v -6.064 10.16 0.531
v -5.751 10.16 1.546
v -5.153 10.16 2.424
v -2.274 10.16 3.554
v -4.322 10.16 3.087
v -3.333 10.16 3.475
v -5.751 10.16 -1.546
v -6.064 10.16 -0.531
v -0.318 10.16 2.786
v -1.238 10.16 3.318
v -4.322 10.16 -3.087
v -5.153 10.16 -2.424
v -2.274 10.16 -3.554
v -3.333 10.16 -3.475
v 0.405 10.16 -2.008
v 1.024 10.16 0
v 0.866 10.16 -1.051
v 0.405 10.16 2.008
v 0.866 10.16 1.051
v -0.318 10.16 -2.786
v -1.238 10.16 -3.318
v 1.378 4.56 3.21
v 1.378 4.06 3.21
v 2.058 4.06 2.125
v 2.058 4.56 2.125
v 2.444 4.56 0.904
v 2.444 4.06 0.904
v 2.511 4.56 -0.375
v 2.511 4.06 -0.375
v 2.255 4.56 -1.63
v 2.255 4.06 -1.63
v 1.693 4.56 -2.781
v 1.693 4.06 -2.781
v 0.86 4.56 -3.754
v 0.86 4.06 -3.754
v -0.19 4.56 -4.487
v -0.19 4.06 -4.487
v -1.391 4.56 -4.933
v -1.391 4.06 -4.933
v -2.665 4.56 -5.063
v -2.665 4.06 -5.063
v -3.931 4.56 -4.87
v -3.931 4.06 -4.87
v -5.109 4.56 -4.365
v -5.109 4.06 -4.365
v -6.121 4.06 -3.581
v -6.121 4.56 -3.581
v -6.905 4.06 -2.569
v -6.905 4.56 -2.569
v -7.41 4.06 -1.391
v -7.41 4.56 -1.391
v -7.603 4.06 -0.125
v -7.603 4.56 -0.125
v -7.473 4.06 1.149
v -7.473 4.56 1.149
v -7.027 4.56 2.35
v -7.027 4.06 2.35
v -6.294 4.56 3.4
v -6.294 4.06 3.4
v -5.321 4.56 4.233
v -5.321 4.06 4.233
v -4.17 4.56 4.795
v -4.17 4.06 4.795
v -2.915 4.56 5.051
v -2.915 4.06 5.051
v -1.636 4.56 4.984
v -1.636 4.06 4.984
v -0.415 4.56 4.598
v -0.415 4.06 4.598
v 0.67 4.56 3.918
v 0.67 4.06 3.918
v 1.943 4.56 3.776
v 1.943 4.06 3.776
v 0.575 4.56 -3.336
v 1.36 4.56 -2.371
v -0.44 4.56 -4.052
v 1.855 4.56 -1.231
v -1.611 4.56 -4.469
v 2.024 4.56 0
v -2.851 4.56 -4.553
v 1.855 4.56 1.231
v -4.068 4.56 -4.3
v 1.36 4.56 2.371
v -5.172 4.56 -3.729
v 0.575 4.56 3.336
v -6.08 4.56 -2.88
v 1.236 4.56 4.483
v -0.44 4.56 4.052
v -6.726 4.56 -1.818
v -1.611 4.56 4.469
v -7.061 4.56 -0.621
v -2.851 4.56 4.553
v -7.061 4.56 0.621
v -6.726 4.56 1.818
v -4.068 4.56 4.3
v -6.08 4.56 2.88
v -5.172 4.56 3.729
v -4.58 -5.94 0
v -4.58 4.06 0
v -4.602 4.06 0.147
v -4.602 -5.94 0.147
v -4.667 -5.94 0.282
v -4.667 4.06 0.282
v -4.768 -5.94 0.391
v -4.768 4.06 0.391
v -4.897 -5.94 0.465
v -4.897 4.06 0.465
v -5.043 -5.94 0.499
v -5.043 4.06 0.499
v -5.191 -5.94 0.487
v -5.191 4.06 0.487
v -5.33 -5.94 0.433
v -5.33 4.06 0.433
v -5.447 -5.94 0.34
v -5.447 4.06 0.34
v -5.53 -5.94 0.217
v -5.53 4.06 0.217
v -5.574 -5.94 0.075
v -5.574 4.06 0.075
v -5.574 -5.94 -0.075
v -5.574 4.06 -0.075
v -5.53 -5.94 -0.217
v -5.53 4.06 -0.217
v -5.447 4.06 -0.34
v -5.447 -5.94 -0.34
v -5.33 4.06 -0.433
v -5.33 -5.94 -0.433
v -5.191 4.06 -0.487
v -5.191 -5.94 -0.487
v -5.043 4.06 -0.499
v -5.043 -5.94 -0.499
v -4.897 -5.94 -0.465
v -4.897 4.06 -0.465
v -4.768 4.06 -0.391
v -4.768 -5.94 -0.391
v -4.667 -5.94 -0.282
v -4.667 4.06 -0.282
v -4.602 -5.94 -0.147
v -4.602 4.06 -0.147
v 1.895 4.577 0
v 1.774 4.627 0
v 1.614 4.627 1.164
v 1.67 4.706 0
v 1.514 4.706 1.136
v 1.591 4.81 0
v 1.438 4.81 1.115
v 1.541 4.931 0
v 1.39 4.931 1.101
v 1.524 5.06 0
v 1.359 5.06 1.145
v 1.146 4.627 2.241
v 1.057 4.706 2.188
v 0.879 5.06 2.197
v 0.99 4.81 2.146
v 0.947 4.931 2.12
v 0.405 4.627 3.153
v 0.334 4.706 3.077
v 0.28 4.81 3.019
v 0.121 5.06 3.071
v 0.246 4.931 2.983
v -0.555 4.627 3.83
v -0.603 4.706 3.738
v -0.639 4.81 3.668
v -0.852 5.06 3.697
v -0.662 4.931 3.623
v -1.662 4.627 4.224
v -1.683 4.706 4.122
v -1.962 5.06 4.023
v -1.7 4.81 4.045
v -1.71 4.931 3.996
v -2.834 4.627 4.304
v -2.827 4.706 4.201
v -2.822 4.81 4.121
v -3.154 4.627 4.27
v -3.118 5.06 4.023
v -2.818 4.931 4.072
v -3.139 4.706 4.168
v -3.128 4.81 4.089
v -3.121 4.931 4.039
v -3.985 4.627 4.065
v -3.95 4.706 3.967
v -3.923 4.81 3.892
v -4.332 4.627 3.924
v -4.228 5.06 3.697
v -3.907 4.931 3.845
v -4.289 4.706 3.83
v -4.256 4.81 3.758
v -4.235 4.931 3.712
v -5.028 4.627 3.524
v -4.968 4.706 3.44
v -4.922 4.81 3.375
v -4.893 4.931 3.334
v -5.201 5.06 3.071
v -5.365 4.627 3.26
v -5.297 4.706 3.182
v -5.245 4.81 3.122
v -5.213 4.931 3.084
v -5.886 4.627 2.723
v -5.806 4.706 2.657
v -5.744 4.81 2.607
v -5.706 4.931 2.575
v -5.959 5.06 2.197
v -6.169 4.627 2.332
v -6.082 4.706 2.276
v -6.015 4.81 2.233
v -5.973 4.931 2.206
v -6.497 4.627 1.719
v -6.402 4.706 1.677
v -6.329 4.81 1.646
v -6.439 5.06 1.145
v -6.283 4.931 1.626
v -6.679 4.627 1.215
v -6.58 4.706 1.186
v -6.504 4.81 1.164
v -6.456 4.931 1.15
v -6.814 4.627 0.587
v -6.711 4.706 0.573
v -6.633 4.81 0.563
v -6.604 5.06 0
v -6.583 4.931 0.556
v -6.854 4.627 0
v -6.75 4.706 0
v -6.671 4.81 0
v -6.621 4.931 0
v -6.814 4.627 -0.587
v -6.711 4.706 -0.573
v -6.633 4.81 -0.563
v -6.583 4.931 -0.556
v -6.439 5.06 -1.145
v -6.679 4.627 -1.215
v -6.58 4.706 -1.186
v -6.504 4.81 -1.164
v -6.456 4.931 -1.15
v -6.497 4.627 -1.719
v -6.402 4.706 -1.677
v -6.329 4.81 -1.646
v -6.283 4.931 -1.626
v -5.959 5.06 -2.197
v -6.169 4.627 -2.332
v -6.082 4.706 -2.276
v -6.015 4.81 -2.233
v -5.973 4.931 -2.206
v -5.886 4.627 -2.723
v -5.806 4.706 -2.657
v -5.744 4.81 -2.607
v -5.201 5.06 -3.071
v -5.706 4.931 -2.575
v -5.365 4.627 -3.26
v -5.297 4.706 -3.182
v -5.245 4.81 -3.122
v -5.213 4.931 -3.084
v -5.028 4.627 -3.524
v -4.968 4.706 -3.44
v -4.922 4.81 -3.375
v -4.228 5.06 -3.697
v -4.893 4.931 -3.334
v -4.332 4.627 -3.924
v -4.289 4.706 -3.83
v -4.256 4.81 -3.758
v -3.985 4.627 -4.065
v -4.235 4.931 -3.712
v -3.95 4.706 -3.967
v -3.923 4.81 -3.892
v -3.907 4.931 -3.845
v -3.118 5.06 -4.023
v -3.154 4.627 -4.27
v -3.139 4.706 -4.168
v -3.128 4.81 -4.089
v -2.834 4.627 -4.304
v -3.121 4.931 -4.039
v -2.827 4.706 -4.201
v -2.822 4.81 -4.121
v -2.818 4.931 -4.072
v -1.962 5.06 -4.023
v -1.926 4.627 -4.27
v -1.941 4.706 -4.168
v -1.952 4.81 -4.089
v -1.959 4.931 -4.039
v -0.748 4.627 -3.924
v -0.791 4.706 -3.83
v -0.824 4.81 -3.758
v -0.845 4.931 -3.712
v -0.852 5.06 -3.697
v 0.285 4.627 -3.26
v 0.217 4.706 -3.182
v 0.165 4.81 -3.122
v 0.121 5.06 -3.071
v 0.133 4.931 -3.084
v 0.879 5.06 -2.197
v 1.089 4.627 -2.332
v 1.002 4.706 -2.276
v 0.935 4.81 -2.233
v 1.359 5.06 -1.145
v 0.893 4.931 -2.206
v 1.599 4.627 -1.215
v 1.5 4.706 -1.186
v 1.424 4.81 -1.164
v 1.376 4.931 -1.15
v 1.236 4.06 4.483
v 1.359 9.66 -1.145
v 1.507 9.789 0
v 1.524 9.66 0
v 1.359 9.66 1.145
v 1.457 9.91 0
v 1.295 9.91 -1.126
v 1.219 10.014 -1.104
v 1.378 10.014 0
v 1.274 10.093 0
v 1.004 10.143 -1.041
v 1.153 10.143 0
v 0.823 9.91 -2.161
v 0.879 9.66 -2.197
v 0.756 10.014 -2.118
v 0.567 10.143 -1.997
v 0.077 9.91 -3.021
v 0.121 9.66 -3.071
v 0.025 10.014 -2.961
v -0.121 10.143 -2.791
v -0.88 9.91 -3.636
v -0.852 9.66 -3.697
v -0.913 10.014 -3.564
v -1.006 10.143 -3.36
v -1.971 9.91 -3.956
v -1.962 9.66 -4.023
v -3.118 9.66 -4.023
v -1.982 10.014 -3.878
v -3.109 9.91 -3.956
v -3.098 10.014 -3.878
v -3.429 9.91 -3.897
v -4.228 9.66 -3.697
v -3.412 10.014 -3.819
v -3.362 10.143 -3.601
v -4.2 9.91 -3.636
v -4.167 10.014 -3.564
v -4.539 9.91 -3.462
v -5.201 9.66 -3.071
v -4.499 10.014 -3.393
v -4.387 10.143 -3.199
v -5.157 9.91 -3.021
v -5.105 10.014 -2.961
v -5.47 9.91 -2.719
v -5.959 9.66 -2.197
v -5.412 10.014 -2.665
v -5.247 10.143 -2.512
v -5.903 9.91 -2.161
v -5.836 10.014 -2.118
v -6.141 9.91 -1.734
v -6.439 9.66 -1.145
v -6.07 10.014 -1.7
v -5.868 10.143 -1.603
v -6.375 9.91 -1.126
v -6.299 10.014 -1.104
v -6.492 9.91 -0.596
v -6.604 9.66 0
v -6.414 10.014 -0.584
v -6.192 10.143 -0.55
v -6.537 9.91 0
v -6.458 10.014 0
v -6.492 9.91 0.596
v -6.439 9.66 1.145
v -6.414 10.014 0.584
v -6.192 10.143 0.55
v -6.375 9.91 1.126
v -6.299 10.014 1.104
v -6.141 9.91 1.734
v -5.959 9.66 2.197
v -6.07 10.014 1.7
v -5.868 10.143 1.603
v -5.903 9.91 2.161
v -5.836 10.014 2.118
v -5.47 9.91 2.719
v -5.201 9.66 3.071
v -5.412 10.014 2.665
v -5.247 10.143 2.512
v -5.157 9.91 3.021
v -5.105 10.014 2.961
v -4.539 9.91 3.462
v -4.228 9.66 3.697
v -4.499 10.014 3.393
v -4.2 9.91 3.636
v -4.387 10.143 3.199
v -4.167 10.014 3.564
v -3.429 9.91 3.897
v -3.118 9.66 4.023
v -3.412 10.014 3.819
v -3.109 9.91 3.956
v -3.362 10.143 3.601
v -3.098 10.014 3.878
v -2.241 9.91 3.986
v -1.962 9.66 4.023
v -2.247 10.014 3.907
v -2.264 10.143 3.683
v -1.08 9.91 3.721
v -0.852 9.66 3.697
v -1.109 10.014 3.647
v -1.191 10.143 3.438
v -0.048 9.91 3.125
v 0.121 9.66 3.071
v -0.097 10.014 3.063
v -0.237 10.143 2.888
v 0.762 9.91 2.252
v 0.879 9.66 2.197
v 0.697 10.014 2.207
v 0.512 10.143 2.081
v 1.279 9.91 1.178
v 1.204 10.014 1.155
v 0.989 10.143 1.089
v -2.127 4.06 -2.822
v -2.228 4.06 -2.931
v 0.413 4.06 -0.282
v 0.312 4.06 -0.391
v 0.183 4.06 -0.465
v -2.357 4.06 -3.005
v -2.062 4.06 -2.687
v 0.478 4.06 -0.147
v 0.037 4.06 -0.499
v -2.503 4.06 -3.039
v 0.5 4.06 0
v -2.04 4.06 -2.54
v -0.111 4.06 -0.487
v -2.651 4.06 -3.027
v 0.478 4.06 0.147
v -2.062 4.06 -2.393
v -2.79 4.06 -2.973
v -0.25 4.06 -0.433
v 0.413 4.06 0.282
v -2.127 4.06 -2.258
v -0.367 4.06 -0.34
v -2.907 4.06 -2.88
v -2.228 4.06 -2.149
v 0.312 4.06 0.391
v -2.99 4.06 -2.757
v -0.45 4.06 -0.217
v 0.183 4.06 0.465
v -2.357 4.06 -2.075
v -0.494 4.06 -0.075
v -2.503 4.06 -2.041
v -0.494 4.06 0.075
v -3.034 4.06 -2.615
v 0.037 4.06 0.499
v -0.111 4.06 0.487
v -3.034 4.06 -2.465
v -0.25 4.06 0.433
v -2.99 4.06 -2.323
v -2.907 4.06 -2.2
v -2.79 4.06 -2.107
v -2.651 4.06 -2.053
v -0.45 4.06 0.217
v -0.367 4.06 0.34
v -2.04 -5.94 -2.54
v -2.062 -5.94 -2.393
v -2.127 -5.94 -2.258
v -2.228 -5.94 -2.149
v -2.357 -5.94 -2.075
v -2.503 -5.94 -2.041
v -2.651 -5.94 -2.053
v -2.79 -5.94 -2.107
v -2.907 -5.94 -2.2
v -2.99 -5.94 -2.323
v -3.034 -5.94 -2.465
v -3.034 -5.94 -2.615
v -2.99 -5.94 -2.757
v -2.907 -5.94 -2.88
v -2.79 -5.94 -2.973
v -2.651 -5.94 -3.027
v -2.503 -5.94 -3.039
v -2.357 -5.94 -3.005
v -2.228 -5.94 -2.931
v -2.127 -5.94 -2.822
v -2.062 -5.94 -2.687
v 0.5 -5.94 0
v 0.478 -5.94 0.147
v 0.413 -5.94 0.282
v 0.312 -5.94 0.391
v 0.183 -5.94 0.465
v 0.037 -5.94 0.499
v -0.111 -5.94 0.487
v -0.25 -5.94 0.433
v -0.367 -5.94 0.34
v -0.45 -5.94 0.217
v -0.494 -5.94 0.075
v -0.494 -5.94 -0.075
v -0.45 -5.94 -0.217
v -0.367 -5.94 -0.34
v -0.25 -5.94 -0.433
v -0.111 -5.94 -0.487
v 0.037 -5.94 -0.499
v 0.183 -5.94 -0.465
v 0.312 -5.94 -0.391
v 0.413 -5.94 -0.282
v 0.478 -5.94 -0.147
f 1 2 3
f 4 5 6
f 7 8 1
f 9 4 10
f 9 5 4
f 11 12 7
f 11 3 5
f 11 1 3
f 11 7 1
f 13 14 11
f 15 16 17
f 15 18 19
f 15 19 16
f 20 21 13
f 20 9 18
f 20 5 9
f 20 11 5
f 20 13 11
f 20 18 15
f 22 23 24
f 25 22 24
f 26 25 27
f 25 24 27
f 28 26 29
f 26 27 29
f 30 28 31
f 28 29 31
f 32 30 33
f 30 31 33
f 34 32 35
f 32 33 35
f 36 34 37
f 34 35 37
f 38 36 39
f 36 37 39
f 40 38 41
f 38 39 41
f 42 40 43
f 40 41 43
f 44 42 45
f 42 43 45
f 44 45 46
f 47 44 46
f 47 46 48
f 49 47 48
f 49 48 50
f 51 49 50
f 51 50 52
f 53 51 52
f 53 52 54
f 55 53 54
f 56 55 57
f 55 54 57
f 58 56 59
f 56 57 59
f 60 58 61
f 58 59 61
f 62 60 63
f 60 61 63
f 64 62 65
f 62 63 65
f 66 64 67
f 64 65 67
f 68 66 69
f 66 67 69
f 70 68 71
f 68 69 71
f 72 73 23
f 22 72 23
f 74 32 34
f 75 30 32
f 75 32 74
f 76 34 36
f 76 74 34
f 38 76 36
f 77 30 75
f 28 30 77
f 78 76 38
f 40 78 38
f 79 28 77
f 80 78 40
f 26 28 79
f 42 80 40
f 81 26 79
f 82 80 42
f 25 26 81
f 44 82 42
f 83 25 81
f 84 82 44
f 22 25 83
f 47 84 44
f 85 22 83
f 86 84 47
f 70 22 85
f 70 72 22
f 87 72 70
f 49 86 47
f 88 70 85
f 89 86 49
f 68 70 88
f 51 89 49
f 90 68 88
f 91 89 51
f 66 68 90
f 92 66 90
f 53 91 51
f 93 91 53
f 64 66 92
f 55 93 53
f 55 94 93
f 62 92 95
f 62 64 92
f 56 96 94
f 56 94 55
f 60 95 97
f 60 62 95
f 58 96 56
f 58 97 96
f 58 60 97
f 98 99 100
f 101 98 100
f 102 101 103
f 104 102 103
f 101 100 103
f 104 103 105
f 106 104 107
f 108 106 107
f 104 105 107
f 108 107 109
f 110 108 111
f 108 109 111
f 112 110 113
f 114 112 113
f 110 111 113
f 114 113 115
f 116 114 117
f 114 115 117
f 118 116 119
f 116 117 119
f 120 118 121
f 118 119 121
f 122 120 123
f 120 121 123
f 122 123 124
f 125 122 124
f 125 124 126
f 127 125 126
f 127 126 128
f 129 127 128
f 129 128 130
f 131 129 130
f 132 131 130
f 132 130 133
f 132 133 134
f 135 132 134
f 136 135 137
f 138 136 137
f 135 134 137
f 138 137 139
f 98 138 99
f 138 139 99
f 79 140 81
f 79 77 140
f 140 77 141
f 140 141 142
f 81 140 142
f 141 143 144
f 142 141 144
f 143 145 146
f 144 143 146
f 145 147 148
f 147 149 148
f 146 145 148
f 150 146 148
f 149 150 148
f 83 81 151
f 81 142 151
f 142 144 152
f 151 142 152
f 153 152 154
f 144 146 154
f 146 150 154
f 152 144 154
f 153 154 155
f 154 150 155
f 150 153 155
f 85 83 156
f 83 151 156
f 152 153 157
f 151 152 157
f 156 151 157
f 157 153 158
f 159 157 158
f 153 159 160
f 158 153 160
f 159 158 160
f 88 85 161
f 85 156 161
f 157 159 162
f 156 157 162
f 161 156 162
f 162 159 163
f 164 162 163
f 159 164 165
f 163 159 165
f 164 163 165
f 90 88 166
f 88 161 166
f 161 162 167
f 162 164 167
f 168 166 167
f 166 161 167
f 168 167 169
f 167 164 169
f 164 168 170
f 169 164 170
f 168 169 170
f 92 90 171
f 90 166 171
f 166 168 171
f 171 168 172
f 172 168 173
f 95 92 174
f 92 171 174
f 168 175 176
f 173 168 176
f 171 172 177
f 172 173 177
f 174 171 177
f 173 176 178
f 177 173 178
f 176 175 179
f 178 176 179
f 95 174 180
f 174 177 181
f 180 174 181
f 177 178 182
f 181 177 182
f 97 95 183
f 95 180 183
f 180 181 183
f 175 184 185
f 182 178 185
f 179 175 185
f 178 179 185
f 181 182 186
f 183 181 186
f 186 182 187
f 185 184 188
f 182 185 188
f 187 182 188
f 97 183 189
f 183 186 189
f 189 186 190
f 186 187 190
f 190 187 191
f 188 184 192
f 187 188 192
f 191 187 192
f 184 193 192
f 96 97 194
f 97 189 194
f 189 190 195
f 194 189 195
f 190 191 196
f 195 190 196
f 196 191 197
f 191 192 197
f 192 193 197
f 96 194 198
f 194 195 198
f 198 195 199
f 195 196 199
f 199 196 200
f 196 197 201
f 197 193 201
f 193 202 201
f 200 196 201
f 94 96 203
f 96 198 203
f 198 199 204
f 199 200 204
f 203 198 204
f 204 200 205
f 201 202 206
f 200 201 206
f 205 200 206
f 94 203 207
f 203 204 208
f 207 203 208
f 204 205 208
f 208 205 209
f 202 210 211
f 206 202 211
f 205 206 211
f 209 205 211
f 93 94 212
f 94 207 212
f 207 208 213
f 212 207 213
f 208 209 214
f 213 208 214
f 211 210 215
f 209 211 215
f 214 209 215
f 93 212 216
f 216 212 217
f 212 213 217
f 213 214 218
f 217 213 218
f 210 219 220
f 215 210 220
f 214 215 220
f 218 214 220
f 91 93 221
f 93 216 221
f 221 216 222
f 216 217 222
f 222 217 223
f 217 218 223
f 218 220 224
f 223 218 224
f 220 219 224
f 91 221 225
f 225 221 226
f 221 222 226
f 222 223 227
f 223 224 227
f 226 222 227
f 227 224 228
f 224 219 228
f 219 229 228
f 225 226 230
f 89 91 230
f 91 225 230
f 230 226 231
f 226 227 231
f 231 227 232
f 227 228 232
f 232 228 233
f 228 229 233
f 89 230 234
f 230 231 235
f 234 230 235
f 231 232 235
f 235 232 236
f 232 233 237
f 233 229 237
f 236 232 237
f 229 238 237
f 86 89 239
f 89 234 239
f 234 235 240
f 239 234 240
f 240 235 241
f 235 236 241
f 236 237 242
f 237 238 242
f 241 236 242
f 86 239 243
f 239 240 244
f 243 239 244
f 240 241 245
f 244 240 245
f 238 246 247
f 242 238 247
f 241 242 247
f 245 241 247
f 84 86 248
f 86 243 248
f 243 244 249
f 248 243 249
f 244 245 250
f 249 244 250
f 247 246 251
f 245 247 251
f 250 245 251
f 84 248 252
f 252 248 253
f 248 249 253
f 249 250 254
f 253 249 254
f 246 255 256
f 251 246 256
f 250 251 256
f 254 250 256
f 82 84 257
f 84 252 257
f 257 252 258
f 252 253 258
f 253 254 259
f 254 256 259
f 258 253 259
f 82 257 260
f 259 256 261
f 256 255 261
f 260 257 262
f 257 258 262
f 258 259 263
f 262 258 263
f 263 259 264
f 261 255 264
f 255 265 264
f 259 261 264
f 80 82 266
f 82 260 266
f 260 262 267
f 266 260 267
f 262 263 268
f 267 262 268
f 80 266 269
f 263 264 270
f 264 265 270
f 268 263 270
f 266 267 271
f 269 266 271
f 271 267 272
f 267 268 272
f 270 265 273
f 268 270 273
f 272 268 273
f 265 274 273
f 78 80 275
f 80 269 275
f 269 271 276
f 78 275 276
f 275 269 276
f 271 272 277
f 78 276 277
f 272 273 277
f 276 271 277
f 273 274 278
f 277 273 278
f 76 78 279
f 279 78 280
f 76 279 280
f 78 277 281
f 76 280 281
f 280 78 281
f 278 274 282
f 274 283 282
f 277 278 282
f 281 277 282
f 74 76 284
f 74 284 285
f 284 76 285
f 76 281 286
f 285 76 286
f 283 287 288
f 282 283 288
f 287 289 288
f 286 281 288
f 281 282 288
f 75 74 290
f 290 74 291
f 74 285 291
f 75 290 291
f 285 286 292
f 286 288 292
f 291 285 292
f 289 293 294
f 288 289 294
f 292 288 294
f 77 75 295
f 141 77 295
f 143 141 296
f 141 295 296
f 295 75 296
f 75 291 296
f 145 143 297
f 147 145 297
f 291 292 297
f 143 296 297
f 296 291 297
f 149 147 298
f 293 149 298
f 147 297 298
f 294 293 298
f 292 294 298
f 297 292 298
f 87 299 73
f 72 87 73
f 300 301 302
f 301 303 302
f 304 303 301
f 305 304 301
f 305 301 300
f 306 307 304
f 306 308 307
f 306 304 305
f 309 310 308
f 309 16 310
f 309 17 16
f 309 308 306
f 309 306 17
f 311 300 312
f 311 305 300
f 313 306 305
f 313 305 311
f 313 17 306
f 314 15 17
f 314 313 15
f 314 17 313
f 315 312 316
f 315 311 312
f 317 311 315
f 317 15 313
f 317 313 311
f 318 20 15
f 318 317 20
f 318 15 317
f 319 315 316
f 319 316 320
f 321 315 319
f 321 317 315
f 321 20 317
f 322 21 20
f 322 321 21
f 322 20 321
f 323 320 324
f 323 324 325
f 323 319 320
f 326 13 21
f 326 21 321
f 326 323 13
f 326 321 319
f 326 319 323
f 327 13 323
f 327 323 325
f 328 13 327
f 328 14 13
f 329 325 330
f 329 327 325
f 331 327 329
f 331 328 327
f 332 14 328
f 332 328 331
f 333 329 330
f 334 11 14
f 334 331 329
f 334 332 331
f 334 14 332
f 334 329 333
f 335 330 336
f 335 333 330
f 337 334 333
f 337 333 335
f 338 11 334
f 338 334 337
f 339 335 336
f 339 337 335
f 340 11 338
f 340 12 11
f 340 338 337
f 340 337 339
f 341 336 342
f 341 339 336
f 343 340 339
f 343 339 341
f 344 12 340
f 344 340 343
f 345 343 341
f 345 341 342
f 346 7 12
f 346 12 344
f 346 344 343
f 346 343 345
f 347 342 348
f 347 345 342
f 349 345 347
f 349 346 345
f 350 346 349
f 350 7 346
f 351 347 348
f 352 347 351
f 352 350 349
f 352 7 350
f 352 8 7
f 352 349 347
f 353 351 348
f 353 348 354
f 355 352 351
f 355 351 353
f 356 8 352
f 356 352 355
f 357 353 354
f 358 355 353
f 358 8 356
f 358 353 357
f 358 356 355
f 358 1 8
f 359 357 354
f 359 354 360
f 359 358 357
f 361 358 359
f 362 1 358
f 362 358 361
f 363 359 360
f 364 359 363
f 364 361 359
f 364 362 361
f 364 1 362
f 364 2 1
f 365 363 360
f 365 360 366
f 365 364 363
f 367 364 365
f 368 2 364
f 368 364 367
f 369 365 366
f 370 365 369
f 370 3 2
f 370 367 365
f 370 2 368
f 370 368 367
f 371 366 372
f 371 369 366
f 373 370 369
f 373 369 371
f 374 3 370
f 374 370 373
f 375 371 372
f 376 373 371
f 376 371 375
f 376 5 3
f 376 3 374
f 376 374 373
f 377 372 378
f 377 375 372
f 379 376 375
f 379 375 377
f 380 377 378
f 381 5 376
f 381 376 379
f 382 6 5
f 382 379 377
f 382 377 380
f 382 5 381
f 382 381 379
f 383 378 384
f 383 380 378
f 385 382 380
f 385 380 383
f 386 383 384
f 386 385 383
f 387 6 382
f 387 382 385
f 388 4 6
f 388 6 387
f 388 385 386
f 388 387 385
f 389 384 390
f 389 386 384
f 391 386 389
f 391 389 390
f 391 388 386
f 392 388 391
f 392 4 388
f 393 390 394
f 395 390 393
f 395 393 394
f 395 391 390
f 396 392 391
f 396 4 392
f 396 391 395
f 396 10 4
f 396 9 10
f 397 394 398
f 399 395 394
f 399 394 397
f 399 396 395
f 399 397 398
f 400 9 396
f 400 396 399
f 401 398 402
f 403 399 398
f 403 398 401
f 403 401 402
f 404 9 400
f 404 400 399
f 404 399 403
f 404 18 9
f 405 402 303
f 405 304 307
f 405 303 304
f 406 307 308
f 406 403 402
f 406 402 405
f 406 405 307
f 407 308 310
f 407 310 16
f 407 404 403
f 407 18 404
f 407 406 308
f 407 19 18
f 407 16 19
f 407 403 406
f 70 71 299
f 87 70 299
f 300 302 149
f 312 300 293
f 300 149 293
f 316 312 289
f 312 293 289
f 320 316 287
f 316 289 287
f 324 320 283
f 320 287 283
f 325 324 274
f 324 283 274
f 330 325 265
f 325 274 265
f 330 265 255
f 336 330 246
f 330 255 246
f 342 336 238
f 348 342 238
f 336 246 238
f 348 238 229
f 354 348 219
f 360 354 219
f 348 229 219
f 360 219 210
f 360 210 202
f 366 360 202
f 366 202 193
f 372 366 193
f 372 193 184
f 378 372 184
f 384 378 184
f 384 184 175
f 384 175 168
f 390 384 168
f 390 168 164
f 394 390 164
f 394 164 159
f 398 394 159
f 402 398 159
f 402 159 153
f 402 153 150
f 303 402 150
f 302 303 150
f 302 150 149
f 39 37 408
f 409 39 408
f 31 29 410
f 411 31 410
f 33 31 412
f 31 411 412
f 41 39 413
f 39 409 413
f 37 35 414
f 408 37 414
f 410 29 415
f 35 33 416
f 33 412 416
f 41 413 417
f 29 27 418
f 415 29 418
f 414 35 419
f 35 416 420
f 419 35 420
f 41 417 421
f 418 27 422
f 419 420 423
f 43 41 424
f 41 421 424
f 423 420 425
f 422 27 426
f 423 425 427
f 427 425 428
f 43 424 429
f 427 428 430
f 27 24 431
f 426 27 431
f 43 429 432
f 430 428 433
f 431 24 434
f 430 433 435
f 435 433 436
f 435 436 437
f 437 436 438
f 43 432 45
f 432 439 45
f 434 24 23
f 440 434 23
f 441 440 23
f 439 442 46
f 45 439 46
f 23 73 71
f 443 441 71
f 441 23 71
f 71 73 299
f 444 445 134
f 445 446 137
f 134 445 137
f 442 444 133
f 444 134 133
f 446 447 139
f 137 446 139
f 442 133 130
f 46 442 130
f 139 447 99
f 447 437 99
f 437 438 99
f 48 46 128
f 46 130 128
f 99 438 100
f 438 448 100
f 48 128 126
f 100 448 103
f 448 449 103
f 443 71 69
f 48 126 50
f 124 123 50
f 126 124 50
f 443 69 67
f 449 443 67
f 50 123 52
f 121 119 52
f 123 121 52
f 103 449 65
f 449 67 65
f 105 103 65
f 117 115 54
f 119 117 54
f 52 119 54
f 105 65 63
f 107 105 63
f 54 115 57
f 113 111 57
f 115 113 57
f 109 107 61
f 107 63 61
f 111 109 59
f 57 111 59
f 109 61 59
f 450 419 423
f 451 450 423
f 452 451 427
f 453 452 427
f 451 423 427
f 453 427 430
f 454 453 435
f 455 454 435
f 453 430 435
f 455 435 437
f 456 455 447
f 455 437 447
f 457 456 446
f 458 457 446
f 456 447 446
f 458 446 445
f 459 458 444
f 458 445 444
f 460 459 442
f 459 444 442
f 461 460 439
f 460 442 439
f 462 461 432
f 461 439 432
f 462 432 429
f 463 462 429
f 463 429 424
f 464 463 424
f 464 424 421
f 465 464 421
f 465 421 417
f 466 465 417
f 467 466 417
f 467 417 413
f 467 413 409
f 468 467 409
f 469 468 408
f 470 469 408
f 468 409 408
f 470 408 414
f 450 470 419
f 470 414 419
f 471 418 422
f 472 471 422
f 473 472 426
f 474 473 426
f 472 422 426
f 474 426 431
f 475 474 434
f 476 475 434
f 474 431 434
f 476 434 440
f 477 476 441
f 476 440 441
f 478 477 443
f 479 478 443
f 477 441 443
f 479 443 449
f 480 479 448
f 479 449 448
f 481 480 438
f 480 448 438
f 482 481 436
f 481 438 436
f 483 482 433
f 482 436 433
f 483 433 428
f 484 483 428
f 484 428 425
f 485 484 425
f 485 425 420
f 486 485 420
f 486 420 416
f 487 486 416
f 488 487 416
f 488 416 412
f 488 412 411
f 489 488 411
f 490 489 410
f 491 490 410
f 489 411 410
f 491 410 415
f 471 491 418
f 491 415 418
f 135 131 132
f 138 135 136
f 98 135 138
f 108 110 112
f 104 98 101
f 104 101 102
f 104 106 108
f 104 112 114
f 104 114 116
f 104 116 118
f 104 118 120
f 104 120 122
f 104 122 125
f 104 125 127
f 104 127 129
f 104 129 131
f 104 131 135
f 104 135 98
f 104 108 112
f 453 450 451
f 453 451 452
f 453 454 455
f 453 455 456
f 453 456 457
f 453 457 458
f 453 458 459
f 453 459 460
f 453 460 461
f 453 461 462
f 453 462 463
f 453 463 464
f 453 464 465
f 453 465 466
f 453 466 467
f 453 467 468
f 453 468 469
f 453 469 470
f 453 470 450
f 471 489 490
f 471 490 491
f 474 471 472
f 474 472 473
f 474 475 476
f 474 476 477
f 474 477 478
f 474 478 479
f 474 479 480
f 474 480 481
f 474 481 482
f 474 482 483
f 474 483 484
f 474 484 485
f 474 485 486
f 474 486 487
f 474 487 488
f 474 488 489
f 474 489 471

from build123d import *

# Parameters (mm, degrees)
SKETCH_R   = 4.064
BODY_DEPTH = 6.1
SKETCH1_R  = 0.5
LEGS_DEPTH = 10
LIP_DEPTH  = 0.5
FILLET2_R  = 0.5


with BuildPart() as part:
    # sketch → Body (new body)
    with BuildSketch(Plane(origin=(0, 4.06, 0), x_dir=(1, 0, 0), z_dir=(0, 1, 0))):
        with Locations((-2.54, 0)):
            Circle(SKETCH_R)
    extrude(amount=BODY_DEPTH)

    # Sketch1 → Legs (add)
    with BuildSketch(Plane.XZ.offset(-4.06)):
        Circle(SKETCH1_R)
        with Locations((-2.54, -2.54)):
            Circle(SKETCH1_R)
        with Locations((-5.08, 0)):
            Circle(SKETCH1_R)
    extrude(amount=LEGS_DEPTH)

    # Sketch3 → Lip (add)
    with BuildSketch(Plane.XZ.offset(-4.06)):
        with BuildLine():
            Line((1.236134349, 4.48324113), (1.94324113, 3.776134349))
            Line((1.94324113, 3.776134349), (1.377555705, 3.210448924))
            ThreePointArc((1.377555705, 3.210448924), (-6.121495847, -3.581495847), (0.670448924, 3.917555705))
            Line((0.670448924, 3.917555705), (1.236134349, 4.48324113))
        make_face()
    extrude(amount=-LIP_DEPTH)

    # Fillet2
    fillet2_edges = [part.edges().sort_by_distance(p)[0] for p in [
        (-6.604, 4.56, 0),
        (-6.604, 10.16, 0),
    ]]
    fillet(fillet2_edges, radius=FILLET2_R)


solid = part.part
